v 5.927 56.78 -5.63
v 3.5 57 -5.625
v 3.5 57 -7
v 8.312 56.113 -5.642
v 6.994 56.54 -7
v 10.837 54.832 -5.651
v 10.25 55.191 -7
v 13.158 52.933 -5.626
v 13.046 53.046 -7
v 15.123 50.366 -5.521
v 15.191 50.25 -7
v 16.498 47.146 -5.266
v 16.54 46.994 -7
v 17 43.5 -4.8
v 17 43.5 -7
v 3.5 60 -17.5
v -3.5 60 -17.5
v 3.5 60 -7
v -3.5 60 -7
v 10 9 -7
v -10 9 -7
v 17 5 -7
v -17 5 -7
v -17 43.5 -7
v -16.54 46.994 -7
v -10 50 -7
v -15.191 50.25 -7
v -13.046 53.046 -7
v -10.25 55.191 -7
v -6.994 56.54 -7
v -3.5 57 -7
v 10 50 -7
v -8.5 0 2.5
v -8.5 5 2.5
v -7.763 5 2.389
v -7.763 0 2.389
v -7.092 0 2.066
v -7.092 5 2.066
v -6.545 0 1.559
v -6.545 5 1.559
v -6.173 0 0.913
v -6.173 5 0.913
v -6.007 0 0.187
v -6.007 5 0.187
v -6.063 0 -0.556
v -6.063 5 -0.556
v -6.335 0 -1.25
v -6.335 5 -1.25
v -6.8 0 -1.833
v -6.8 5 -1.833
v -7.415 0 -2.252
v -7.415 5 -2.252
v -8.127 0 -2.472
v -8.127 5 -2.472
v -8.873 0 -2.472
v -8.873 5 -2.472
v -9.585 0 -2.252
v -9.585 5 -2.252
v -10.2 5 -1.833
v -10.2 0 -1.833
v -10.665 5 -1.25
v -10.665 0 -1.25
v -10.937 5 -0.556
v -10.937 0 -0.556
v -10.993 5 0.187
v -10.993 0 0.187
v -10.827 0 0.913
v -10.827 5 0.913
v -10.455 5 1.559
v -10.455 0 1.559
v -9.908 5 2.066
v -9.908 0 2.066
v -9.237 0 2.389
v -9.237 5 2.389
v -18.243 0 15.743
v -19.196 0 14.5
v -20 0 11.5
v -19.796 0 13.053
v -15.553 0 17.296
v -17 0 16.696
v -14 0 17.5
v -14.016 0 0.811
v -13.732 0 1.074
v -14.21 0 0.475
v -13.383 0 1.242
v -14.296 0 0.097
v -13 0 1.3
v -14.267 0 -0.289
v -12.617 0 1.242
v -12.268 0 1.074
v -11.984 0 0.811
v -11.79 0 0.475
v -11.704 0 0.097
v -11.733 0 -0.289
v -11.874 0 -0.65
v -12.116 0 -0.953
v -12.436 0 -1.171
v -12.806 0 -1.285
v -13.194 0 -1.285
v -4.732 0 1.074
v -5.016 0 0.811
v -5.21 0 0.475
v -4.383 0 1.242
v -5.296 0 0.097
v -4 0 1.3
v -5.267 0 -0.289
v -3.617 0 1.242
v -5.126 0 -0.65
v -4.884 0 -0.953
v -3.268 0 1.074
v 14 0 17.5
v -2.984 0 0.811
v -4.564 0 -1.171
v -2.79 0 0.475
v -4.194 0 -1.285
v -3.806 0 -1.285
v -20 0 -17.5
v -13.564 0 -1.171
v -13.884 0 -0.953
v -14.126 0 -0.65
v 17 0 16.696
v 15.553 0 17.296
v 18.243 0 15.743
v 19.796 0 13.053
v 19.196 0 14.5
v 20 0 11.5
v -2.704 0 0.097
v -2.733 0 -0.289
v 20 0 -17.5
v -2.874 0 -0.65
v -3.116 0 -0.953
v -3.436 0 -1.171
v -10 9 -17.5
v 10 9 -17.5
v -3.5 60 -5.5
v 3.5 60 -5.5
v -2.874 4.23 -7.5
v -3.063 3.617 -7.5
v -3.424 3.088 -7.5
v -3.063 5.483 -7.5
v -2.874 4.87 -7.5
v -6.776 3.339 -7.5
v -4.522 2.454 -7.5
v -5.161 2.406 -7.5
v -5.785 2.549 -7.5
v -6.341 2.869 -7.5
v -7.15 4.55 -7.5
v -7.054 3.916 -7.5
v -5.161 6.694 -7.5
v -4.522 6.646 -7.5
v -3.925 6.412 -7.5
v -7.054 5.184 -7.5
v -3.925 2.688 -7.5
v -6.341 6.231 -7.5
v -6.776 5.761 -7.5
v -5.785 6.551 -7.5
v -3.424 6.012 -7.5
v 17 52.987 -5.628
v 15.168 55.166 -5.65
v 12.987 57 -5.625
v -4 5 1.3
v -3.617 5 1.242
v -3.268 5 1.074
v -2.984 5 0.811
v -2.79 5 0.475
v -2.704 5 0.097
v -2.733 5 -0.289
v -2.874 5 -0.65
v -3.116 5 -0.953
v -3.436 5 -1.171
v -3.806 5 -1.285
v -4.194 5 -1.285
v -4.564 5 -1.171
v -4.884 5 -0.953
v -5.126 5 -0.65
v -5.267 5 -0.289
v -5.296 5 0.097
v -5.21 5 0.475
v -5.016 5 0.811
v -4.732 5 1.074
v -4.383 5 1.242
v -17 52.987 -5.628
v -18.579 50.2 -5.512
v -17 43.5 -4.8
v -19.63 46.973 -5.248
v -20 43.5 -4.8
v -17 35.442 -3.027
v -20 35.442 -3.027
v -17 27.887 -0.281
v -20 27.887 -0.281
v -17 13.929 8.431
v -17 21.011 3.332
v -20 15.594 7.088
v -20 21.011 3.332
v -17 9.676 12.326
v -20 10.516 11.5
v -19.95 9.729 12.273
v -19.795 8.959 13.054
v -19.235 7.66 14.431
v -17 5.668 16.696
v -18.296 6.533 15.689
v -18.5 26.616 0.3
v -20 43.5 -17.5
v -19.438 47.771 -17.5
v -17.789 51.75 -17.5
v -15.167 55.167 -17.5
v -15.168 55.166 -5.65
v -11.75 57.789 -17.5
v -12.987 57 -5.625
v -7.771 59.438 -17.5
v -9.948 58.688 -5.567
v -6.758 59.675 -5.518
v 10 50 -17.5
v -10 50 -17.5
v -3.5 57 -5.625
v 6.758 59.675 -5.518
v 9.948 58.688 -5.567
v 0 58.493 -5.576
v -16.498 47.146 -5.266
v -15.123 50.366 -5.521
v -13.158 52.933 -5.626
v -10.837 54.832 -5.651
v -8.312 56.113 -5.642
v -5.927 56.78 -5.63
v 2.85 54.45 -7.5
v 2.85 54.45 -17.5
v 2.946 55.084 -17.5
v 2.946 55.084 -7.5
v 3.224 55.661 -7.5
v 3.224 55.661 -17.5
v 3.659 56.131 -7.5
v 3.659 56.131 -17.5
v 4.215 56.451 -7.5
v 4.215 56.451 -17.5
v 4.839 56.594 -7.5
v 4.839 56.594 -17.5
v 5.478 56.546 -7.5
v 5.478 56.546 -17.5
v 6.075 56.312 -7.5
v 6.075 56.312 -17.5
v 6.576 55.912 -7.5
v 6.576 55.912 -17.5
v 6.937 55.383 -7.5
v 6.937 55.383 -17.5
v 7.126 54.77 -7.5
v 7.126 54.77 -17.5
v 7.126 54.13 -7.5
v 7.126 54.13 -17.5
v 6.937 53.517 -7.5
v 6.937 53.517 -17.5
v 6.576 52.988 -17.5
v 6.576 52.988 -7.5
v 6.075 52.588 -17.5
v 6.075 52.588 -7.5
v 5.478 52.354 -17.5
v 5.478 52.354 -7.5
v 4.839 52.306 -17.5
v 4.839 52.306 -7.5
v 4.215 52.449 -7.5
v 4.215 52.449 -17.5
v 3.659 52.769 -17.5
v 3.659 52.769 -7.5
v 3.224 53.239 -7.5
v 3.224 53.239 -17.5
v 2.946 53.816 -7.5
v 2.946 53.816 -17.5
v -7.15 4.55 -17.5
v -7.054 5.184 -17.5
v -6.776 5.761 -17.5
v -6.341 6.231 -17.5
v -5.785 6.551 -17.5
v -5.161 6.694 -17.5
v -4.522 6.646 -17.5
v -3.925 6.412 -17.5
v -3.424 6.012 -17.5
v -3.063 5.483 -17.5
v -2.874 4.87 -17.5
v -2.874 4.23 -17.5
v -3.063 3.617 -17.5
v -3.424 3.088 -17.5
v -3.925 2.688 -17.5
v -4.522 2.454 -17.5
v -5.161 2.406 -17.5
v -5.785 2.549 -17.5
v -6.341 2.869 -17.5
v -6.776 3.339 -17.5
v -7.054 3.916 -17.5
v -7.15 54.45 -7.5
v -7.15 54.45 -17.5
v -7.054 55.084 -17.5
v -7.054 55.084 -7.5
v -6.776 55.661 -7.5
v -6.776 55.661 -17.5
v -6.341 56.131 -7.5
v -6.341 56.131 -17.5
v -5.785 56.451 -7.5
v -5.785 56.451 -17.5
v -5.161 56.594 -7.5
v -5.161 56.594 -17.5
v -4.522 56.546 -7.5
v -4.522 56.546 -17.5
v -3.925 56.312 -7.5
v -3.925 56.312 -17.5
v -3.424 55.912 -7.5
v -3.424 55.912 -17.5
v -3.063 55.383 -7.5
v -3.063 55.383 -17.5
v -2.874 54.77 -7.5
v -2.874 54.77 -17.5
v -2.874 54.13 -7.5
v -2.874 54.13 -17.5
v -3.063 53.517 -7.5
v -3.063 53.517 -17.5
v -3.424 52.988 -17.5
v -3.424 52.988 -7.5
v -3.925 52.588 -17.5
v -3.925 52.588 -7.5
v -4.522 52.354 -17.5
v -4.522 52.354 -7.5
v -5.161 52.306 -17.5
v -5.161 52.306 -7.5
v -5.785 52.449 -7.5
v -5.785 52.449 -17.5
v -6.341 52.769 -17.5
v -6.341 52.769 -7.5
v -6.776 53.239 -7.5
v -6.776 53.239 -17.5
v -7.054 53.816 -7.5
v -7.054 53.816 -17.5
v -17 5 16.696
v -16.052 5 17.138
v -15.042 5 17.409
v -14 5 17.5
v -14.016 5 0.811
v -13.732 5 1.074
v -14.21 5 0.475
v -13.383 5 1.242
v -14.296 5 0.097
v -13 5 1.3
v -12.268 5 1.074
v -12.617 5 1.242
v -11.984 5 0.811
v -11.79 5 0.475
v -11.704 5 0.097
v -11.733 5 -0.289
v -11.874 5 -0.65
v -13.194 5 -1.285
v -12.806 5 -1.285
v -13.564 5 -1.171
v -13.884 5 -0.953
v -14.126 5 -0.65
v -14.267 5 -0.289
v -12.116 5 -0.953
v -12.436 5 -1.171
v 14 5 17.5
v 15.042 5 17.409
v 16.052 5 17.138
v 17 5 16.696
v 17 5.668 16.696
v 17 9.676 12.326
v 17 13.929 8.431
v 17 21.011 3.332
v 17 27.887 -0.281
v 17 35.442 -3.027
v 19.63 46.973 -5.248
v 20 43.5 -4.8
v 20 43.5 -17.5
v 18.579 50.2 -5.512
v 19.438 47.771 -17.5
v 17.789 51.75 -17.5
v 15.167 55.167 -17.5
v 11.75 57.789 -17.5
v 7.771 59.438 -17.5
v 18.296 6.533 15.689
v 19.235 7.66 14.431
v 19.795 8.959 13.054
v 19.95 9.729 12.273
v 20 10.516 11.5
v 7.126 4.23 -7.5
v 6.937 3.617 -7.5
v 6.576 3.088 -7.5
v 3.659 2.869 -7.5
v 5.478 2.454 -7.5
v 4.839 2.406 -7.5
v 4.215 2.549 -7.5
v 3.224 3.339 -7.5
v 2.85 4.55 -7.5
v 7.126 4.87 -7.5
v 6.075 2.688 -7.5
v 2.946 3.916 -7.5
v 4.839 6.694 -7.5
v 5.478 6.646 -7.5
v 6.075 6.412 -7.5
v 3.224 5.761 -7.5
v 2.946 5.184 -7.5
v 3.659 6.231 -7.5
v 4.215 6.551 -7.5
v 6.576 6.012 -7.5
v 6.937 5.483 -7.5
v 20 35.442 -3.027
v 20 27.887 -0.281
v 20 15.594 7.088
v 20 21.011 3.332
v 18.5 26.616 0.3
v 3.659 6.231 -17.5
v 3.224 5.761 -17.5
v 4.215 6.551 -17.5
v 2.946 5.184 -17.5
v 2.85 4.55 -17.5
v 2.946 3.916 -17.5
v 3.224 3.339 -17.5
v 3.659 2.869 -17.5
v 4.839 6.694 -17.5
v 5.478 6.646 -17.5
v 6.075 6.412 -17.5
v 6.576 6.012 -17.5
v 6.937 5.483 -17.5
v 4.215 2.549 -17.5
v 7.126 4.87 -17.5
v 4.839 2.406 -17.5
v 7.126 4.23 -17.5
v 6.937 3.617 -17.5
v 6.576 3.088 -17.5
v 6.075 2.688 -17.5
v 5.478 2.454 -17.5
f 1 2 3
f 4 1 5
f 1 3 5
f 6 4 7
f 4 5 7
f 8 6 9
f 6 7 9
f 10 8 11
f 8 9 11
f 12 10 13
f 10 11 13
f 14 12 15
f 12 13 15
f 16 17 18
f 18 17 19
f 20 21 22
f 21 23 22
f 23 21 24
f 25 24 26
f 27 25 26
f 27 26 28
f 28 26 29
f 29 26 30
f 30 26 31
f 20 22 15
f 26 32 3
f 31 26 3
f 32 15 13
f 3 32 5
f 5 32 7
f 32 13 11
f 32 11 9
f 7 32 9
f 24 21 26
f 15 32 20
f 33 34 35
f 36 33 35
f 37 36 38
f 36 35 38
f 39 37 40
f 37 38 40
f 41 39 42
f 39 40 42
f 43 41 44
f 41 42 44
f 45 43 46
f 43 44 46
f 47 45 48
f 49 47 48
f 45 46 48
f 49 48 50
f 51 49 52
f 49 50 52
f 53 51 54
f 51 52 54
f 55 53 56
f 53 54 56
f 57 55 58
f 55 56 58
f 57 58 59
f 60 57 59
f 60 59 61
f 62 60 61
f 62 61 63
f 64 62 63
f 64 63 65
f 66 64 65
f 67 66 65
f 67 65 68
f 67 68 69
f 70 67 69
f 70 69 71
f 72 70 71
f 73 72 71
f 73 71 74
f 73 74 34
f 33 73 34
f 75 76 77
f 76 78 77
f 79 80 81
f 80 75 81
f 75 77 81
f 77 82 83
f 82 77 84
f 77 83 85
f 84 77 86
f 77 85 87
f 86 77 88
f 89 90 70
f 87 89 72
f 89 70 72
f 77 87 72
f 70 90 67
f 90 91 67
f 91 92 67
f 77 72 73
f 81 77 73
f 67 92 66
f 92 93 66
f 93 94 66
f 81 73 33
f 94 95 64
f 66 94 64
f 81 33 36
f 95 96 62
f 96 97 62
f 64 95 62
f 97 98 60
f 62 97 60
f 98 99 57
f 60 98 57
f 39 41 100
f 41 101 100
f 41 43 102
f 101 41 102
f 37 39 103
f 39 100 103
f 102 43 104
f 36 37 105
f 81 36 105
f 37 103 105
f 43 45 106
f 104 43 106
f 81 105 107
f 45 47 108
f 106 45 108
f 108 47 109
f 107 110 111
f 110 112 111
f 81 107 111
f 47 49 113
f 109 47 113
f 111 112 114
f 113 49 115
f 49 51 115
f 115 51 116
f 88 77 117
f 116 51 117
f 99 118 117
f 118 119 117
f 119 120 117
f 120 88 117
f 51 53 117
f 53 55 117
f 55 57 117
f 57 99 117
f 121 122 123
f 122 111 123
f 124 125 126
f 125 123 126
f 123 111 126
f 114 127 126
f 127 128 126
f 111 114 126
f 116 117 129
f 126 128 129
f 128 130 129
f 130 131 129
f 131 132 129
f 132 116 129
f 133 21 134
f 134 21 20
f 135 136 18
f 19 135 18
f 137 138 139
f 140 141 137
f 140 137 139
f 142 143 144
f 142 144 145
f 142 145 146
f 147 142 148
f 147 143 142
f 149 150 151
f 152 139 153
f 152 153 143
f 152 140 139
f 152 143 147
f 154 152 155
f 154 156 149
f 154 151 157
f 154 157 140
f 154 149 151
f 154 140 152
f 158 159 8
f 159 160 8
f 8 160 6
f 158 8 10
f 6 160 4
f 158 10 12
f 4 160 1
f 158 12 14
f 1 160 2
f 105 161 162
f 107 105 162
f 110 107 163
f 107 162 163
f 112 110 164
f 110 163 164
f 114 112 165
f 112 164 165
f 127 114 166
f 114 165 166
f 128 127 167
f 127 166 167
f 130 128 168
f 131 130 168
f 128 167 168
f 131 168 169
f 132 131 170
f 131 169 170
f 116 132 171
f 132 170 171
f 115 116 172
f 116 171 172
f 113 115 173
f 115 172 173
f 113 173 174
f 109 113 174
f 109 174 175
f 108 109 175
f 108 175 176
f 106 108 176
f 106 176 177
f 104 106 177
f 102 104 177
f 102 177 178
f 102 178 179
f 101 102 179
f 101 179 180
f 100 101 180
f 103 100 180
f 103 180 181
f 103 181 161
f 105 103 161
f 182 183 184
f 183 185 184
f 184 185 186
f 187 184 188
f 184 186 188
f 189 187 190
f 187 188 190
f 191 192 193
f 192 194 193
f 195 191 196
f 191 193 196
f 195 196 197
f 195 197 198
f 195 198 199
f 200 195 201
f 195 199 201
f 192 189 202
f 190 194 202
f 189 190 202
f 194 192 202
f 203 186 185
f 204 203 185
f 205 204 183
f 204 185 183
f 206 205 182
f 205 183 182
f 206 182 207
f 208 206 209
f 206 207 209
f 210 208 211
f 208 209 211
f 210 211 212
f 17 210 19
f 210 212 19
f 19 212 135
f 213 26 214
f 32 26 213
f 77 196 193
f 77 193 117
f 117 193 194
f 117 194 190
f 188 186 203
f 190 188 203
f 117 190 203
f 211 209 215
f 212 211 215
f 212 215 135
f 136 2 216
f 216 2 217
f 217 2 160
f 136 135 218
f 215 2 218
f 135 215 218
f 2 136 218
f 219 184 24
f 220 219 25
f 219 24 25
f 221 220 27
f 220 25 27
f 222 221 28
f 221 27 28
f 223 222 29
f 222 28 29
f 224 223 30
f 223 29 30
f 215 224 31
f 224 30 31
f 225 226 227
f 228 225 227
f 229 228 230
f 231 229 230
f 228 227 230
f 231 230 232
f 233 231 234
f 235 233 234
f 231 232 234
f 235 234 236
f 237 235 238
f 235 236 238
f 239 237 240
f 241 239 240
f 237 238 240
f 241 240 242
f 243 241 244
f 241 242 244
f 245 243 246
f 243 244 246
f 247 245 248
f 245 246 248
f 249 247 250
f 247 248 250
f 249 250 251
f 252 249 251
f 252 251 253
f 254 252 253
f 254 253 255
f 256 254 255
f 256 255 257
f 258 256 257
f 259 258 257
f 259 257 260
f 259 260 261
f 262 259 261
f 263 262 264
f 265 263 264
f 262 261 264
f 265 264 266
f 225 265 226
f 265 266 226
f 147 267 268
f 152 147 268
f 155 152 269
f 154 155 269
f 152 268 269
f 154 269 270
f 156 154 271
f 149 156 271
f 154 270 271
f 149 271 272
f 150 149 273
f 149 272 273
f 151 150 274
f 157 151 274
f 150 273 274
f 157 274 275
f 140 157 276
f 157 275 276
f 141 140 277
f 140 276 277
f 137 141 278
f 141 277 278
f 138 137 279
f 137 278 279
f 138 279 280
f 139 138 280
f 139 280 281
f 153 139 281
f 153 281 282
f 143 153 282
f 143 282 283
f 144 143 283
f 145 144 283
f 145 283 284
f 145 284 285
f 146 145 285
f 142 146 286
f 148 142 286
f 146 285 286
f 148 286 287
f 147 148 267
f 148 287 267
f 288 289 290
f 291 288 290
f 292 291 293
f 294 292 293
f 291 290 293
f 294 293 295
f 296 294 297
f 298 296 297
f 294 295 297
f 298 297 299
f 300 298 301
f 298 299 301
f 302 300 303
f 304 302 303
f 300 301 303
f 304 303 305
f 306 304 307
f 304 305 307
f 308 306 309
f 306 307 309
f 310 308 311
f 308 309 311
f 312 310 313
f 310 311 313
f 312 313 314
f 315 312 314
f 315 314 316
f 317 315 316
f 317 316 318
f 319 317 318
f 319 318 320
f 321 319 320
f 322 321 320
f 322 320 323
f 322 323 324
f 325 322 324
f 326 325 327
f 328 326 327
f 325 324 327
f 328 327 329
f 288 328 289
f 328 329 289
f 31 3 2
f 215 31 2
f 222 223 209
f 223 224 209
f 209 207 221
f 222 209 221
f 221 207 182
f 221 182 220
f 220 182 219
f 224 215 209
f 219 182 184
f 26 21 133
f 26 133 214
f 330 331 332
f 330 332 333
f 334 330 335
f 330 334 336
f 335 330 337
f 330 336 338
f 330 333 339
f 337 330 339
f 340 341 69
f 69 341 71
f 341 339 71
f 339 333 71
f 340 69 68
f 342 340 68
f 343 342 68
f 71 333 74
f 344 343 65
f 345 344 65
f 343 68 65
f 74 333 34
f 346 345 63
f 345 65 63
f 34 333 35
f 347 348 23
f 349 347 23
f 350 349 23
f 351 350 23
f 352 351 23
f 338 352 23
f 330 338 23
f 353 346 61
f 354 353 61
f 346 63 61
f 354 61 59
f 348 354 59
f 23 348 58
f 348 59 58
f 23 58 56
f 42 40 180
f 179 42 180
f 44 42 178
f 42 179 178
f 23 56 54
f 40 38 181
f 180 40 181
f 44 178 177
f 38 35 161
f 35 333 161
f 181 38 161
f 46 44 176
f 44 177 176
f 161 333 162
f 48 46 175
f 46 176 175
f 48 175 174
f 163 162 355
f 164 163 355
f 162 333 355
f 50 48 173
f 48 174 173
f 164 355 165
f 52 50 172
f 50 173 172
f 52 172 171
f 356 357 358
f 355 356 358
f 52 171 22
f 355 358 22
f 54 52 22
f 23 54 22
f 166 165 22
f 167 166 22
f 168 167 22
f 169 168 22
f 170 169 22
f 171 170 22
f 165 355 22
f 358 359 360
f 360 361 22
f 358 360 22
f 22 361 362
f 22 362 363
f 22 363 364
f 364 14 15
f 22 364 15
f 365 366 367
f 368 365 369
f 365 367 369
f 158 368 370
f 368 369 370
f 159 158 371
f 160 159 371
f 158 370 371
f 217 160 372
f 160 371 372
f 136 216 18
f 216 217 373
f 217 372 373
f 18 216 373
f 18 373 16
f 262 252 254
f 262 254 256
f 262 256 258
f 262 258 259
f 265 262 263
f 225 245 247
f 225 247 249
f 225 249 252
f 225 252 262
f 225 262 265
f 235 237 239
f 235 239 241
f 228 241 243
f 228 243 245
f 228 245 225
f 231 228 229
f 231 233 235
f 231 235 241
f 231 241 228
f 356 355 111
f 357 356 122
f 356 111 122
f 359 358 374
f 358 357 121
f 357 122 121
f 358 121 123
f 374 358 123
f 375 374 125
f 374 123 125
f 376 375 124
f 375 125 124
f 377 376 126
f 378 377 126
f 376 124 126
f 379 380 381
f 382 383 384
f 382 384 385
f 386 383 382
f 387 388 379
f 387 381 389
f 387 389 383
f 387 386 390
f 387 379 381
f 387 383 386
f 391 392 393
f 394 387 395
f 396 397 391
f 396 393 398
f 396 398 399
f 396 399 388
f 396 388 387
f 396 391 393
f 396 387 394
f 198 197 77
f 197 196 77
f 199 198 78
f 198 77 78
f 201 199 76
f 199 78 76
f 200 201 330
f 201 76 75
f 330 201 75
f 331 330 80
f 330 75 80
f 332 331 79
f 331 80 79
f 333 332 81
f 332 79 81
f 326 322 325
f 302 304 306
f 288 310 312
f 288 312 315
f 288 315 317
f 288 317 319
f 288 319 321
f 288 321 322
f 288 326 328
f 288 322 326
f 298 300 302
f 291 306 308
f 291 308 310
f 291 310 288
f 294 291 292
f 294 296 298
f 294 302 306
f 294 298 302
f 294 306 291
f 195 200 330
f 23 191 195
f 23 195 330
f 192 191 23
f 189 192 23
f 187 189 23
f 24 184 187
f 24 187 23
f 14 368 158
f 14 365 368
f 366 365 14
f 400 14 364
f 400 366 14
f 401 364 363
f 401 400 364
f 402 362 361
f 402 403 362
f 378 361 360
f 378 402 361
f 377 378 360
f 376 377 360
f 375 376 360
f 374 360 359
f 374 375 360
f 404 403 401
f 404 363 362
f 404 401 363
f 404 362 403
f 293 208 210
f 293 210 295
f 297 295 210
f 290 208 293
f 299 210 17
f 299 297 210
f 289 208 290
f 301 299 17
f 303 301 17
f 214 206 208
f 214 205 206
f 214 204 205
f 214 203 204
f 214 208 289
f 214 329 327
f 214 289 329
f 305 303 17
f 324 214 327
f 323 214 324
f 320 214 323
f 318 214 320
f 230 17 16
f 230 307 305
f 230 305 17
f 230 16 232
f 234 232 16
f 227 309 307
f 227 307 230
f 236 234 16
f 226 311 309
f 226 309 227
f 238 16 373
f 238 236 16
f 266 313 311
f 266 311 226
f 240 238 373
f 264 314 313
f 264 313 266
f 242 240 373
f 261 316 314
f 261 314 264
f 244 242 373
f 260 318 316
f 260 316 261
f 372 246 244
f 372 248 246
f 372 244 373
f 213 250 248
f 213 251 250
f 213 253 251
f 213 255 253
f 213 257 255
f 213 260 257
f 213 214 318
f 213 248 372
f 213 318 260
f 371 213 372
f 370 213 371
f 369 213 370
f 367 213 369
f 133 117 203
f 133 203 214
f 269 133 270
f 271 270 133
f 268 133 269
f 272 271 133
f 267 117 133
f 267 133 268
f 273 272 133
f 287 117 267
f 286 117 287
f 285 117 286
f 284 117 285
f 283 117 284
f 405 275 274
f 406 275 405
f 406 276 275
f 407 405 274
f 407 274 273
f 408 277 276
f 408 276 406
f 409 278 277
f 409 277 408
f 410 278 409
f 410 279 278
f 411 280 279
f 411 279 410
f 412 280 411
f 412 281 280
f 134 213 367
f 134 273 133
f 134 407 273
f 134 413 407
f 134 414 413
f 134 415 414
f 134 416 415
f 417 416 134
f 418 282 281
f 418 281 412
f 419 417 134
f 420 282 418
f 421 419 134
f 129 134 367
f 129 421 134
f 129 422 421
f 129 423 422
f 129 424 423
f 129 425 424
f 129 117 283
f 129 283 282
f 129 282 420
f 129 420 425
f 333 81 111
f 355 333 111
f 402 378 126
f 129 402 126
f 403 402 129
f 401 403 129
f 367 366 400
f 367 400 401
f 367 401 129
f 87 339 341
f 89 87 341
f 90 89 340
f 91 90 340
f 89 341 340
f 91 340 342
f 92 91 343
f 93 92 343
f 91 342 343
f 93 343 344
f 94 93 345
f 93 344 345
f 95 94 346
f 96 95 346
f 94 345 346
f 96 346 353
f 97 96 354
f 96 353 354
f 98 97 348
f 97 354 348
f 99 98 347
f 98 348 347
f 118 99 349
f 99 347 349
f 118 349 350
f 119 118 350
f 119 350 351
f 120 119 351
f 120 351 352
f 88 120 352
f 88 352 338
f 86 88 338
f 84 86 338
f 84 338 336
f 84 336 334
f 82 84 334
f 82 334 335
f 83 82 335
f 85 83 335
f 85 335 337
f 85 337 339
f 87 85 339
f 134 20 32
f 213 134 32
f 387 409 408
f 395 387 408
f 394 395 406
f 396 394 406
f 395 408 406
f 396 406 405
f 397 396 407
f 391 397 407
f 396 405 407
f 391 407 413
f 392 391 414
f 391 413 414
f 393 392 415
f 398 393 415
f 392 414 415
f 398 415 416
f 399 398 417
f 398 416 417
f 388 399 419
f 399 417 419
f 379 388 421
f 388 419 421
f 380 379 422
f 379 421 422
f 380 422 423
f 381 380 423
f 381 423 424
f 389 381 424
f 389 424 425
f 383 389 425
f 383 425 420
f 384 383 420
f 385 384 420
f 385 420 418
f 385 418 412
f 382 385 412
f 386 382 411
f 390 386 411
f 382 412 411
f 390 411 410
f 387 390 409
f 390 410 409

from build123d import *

# Parameters (mm, degrees)
SKETCH1_W           = 40
SKETCH1_H           = 35
BOSS_EXTRUDE1_DEPTH = 60
SKETCH2_W           = 24.5
SKETCH2_H           = 55
CUT_EXTRUDE1_DEPTH  = 46
BOSS_EXTRUDE2_DEPTH = 3
BOSS_EXTRUDE3_DEPTH = 34
FILLET1_START       = -8
FILLET1_DEPTH       = 3.199770331
FILLET1_START_2     = -17
FILLET1_2_DEPTH     = 34
FILLET2_R           = 16.5
FILLET3_R           = 6
SKETCH5_W           = 20
SKETCH5_H           = 41
CUT_EXTRUDE2_DEPTH  = 68.825143224
SKETCH8_R           = 1.3
SKETCH8_R_2         = 2.5
CUT_EXTRUDE5_DEPTH  = 62.083959026
SKETCH9_R           = 2.15
CUT_EXTRUDE6_DEPTH  = 10


with BuildPart() as part:
    # Sketch1 → Boss-Extrude1 (new body)
    with BuildSketch(Plane(origin=(0, 0, 0), x_dir=(1, 0, 0), z_dir=(0, 1, 0))):
        Rectangle(SKETCH1_W, SKETCH1_H)
    extrude(amount=BOSS_EXTRUDE1_DEPTH)

    # Sketch2 → Cut-Extrude1 (cut)
    with BuildSketch(Plane(origin=(20, 0, 0), x_dir=(0, 0, -1), z_dir=(1, 0, 0))):
        with Locations((-5.25, 32.5)):
            Rectangle(SKETCH2_W, SKETCH2_H)
    extrude(amount=-CUT_EXTRUDE1_DEPTH, mode=Mode.SUBTRACT)

    # Sketch3 → Boss-Extrude2 (add)
    with BuildSketch(Plane(origin=(20, 0, 0), x_dir=(0, 0, -1), z_dir=(1, 0, 0))):
        with BuildLine():
            Line((7, 60), (5.5, 60))
            add(Edge.make_bspline(
                [(5.5, 60), (7.518062239, 25.49671142), (-17.5, 5)],
                knots=[0, 0, 0, 1, 1, 1], degree=2))
            Line((-17.5, 5), (7, 5))
            Line((7, 5), (7, 60))
        make_face()
    boss_extrude2 = extrude(amount=-BOSS_EXTRUDE2_DEPTH)

    # Mirror1: Boss-Extrude2 across plane
    add(boss_extrude2.mirror(Plane(origin=(0, 0, 0), x_dir=(0, 0, 1), z_dir=(1, 0, 0))))

    # Sketch4 → Boss-Extrude3 (add)
    with BuildSketch(Plane.ZY.offset(-17)):
        with BuildLine():
            Line((-7, 60), (-7, 57))
            Line((-7, 57), (-5.625022797, 57))
            add(Edge.make_bspline(
                [(-5.625022797, 57), (-5.588521617, 58.486524947), (-5.499999996, 60.000000071)],
                knots=[0.956135337, 0.956135337, 0.956135337, 1, 1, 1], degree=2))
            Line((-5.499999996, 60.000000071), (-7, 60))
        make_face()
    extrude(amount=BOSS_EXTRUDE3_DEPTH)

    # Fillet1: read off the stored shape, not the designer's step
    # Fillet1 outline → Fillet1 (add)
    with BuildSketch(Plane.XY.offset(FILLET1_START)):
        with BuildLine():
            Line((-17, 57), (-17, 43.5))
            ThreePointArc((-17, 43.5), (-13.045941546, 53.045941546), (-3.5, 57))
            Line((-3.5, 57), (-17, 57))
        make_face()
        with BuildLine():
            Line((17, 57), (3.5, 57))
            ThreePointArc((3.5, 57), (13.045941546, 53.045941546), (17, 43.5))
            Line((17, 43.5), (17, 57))
        make_face()
    extrude(amount=FILLET1_DEPTH)

    # Fillet1 2 outline → Fillet1 2 (cut)
    with BuildSketch(Plane.YZ.offset(FILLET1_START_2)):
        with BuildLine():
            add(Edge.make_bspline(
                [(57, -5.625022797), (49.946623945, -5.798216358), (43.499999985, -4.800229766)],
                knots=[0.043864662, 0.043864662, 0.043864662, 0.251997034, 0.251997034, 0.251997034], degree=2))
            Line((57, -5.625022797), (57, -4.800229669))
            Line((57, -4.800229669), (43.499999985, -4.800229766))
        make_face()
    extrude(amount=FILLET1_2_DEPTH, mode=Mode.SUBTRACT)

    # Fillet2
    # the kernel refuses this fillet: 16.5 mm, written as the material it takes off along each edge
    with BuildSketch(Plane(origin=(20, 60, -58.75), x_dir=(0, -1, 0), z_dir=(0, 0, 1)), Plane(origin=(-20, 60, 35.75), x_dir=(0, -1, 0), z_dir=(0, 0, -1))) as fillet2_piece_1:
        with BuildLine():
            CenterArc((FILLET2_R, -FILLET2_R), FILLET2_R, 90, 90)
            Line((0, -FILLET2_R), (0, 0))
            Line((0, 0), (FILLET2_R, 0))
        make_face()
    extrude(amount=94.5, mode=Mode.SUBTRACT)

    # Fillet3
    # the kernel refuses this fillet: 6 mm, written as the material it takes off along each edge
    with BuildSketch(Plane(origin=(-20, -15, 17.5), x_dir=(0, 0, -1), z_dir=(0, 1, 0))) as fillet3_piece_1:
        with BuildLine():
            CenterArc((FILLET3_R, -FILLET3_R), FILLET3_R, 90, 90)
            Line((0, -FILLET3_R), (0, 0))
            Line((0, 0), (FILLET3_R, 0))
        make_face()
    extrude(amount=35, mode=Mode.SUBTRACT)
    with BuildSketch(Plane(origin=(20, -15, 17.5), x_dir=(0, 0, -1), z_dir=(0, 1, 0))) as fillet3_piece_2:
        with BuildLine():
            CenterArc((FILLET3_R, FILLET3_R), FILLET3_R, 180, 90)
            Line((0, FILLET3_R), (0, 0))
            Line((0, 0), (FILLET3_R, 0))
        make_face()
    extrude(amount=35, mode=Mode.SUBTRACT)

    # Sketch5 → Cut-Extrude2 (cut, through all)
    with BuildSketch(Plane.XY.offset(-7)):
        with Locations((0, 29.5)):
            Rectangle(SKETCH5_W, SKETCH5_H)
    extrude(amount=-CUT_EXTRUDE2_DEPTH, mode=Mode.SUBTRACT)

    # Sketch8 → Cut-Extrude5 (cut, through all)
    with BuildSketch(Plane(origin=(0, 5, 0), x_dir=(1, 0, 0), z_dir=(0, 1, 0))):
        with Locations(Location((-4, 0, 0), (0, 0, 270))):
            Circle(SKETCH8_R)
        with Locations(Location((-8.5, 0, 0), (0, 0, 270))):
            Circle(SKETCH8_R_2)
        with Locations(Location((-13, 0, 0), (0, 0, 270))):
            Circle(SKETCH8_R)
    extrude(amount=-CUT_EXTRUDE5_DEPTH, mode=Mode.SUBTRACT)

    # Sketch9 → Cut-Extrude6 (cut)
    with BuildSketch(Plane(origin=(0, 0, -17.5), x_dir=(-1, 0, 0), z_dir=(0, 0, -1))):
        with Locations((-5, 54.45)):
            Circle(SKETCH9_R)
        with Locations((5, 54.45)):
            Circle(SKETCH9_R)
        with Locations((5, 4.55)):
            Circle(SKETCH9_R)
        with Locations((-5, 4.55)):
            Circle(SKETCH9_R)
    extrude(amount=-CUT_EXTRUDE6_DEPTH, mode=Mode.SUBTRACT)


solid = part.part
